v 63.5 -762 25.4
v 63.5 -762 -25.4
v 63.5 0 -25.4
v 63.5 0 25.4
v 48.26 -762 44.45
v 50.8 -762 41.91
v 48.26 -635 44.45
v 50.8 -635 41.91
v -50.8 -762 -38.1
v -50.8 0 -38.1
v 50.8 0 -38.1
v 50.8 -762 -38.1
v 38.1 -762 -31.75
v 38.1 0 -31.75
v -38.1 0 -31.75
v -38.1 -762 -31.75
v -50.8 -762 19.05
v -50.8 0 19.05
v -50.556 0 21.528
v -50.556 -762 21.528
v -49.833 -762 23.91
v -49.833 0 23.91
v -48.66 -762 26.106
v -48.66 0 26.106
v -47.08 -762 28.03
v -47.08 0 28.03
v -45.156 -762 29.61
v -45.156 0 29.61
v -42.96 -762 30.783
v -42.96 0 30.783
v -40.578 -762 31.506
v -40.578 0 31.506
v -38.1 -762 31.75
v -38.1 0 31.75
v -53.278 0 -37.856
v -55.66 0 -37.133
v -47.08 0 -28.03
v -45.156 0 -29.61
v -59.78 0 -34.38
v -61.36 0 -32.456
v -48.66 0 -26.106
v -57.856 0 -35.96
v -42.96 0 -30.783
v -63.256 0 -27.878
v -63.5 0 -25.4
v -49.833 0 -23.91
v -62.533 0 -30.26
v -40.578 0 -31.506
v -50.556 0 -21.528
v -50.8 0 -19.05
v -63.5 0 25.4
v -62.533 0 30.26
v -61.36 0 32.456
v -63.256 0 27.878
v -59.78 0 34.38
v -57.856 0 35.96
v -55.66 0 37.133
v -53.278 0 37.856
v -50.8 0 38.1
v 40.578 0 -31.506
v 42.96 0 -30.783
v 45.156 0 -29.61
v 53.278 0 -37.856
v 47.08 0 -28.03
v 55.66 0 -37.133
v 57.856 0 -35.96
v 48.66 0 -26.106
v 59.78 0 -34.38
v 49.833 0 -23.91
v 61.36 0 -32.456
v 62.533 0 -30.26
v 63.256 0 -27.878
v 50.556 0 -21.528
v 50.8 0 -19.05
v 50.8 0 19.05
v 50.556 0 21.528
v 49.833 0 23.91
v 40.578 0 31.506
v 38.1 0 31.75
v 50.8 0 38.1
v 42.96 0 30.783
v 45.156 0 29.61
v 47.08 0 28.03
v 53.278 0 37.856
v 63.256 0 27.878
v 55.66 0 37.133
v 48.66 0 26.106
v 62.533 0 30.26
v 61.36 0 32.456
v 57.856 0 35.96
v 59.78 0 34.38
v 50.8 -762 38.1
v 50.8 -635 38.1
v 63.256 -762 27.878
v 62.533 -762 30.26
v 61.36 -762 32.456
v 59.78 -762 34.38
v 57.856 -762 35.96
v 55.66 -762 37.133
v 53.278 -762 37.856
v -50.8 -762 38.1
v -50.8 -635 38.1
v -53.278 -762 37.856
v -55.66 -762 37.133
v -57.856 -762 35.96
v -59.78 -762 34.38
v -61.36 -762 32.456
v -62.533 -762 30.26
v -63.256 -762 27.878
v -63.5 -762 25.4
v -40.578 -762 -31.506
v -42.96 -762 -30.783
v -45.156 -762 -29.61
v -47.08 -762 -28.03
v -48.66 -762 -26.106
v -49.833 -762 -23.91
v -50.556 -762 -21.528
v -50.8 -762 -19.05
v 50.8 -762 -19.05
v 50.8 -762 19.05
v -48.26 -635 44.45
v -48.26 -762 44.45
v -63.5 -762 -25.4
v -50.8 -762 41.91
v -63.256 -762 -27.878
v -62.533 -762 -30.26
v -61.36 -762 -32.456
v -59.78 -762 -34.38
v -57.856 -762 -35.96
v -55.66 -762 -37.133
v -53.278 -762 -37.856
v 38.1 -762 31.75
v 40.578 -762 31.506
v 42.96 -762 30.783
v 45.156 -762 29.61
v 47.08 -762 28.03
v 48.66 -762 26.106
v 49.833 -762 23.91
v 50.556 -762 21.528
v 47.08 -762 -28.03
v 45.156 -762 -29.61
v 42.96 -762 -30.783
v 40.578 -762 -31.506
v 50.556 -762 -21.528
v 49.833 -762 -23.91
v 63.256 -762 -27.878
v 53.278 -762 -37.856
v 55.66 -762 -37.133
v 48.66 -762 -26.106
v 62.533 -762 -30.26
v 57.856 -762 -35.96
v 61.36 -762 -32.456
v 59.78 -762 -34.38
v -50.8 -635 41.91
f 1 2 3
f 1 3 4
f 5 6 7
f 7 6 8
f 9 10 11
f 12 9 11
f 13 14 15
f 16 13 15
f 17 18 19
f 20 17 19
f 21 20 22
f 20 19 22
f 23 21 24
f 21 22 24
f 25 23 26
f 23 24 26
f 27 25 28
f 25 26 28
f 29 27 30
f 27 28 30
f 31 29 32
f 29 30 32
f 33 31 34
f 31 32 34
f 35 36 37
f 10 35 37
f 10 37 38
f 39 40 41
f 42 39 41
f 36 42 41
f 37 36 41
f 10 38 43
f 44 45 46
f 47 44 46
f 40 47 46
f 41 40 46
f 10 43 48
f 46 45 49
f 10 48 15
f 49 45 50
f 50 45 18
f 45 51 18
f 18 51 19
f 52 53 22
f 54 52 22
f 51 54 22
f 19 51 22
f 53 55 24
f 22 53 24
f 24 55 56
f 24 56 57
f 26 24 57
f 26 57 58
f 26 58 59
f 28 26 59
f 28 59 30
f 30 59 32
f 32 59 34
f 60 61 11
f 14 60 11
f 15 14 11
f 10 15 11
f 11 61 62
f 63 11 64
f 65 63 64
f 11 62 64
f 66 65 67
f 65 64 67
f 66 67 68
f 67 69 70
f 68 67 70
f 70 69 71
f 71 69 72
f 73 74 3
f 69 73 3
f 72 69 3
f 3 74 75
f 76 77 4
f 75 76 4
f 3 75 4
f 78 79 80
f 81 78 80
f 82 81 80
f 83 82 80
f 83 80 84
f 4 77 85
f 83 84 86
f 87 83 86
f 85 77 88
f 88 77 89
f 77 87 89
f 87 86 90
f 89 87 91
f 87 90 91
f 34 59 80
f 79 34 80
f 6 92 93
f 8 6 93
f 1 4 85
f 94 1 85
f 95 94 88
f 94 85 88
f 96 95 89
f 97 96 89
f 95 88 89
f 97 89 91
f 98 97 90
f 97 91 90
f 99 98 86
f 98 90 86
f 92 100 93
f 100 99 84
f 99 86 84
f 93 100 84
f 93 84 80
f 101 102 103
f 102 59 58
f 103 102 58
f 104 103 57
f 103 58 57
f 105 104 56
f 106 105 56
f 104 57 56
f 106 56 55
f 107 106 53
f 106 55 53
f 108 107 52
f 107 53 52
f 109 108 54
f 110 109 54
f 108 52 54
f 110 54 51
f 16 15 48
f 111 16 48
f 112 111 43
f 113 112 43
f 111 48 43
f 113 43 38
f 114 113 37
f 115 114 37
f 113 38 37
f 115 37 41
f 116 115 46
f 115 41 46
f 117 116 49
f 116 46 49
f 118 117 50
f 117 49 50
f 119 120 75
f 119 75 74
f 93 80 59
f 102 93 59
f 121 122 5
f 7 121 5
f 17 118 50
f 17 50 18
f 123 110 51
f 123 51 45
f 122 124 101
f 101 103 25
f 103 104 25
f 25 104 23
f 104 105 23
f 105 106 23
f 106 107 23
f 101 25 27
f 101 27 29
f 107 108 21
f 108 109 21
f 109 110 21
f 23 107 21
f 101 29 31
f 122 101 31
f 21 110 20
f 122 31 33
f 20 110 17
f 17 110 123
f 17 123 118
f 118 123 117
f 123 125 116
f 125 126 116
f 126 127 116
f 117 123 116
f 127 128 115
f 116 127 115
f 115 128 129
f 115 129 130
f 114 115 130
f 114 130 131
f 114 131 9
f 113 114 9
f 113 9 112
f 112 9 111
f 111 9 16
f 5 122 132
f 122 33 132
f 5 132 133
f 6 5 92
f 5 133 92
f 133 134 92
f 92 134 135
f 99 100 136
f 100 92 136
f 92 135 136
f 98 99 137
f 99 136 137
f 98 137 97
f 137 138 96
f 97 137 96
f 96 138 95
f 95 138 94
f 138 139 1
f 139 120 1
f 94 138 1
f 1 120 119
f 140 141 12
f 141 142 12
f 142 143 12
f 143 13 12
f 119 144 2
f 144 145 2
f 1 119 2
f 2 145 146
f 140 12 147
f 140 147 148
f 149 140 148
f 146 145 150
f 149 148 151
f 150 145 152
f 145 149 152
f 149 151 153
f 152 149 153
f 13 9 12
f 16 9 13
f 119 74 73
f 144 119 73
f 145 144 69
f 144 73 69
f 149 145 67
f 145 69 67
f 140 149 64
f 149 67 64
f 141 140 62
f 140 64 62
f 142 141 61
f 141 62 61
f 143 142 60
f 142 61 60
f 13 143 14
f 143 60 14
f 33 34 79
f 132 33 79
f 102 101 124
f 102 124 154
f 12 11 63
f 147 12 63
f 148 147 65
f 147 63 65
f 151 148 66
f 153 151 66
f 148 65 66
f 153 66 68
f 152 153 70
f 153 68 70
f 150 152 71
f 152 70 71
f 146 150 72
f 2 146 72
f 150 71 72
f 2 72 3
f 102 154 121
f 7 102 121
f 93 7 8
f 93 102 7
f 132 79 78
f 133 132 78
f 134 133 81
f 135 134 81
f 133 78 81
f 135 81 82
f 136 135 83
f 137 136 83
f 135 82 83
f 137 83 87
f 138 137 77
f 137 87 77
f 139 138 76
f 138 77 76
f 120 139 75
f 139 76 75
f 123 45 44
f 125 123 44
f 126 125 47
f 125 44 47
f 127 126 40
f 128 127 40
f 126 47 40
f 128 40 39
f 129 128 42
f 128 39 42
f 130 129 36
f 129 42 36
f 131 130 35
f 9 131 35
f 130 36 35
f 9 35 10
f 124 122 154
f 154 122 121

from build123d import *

# Parameters (mm, degrees)
F1_DEPTH = 762
F2_W     = 101.6
F2_H     = 127
F3_DEPTH = 6.35
F4_SIZE  = 2.54


with BuildPart() as f1:
    # F0 (on Front) → F1 (new body)
    with BuildSketch(Plane.XZ):
        with BuildLine():
            ThreePointArc((63.5, 25.4), (59.780256, 34.380256), (50.8, 38.1))
            Line((50.8, 38.1), (-50.8, 38.1))
            ThreePointArc((-50.8, 38.1), (-59.780256, 34.380256), (-63.5, 25.4))
            Line((-63.5, 25.4), (-63.5, -25.4))
            ThreePointArc((-63.5, -25.4), (-59.780256, -34.380256), (-50.8, -38.1))
            Line((-50.8, -38.1), (50.8, -38.1))
            ThreePointArc((50.8, -38.1), (59.780256, -34.380256), (63.5, -25.4))
            Line((63.5, -25.4), (63.5, 25.4))
        make_face()
        with BuildLine():
            Line((-38.1, 31.75), (38.1, 31.75))
            ThreePointArc((38.1, 31.75), (47.080256, 28.030256), (50.8, 19.05))
            Line((50.8, 19.05), (50.8, -19.05))
            ThreePointArc((50.8, -19.05), (47.080256, -28.030256), (38.1, -31.75))
            Line((38.1, -31.75), (-38.1, -31.75))
            ThreePointArc((-38.1, -31.75), (-47.080256, -28.030256), (-50.8, -19.05))
            Line((-50.8, -19.05), (-50.8, 19.05))
            ThreePointArc((-50.8, 19.05), (-47.080256, 28.030256), (-38.1, 31.75))
        make_face(mode=Mode.SUBTRACT)
    extrude(amount=F1_DEPTH)

    # F2 (on face) → F3 (join)
    with BuildSketch(Plane.XY.offset(38.1)):
        with Locations((0, -698.5)):
            Rectangle(F2_W, F2_H)
    extrude(amount=F3_DEPTH)

    # F4
    f4_edges = [f1.edges().sort_by_distance(p)[0] for p in [
        (50.8, -698.5, 44.45),
        (-50.8, -698.5, 44.45),
    ]]
    chamfer(f4_edges, length=F4_SIZE)


solid = f1.part
